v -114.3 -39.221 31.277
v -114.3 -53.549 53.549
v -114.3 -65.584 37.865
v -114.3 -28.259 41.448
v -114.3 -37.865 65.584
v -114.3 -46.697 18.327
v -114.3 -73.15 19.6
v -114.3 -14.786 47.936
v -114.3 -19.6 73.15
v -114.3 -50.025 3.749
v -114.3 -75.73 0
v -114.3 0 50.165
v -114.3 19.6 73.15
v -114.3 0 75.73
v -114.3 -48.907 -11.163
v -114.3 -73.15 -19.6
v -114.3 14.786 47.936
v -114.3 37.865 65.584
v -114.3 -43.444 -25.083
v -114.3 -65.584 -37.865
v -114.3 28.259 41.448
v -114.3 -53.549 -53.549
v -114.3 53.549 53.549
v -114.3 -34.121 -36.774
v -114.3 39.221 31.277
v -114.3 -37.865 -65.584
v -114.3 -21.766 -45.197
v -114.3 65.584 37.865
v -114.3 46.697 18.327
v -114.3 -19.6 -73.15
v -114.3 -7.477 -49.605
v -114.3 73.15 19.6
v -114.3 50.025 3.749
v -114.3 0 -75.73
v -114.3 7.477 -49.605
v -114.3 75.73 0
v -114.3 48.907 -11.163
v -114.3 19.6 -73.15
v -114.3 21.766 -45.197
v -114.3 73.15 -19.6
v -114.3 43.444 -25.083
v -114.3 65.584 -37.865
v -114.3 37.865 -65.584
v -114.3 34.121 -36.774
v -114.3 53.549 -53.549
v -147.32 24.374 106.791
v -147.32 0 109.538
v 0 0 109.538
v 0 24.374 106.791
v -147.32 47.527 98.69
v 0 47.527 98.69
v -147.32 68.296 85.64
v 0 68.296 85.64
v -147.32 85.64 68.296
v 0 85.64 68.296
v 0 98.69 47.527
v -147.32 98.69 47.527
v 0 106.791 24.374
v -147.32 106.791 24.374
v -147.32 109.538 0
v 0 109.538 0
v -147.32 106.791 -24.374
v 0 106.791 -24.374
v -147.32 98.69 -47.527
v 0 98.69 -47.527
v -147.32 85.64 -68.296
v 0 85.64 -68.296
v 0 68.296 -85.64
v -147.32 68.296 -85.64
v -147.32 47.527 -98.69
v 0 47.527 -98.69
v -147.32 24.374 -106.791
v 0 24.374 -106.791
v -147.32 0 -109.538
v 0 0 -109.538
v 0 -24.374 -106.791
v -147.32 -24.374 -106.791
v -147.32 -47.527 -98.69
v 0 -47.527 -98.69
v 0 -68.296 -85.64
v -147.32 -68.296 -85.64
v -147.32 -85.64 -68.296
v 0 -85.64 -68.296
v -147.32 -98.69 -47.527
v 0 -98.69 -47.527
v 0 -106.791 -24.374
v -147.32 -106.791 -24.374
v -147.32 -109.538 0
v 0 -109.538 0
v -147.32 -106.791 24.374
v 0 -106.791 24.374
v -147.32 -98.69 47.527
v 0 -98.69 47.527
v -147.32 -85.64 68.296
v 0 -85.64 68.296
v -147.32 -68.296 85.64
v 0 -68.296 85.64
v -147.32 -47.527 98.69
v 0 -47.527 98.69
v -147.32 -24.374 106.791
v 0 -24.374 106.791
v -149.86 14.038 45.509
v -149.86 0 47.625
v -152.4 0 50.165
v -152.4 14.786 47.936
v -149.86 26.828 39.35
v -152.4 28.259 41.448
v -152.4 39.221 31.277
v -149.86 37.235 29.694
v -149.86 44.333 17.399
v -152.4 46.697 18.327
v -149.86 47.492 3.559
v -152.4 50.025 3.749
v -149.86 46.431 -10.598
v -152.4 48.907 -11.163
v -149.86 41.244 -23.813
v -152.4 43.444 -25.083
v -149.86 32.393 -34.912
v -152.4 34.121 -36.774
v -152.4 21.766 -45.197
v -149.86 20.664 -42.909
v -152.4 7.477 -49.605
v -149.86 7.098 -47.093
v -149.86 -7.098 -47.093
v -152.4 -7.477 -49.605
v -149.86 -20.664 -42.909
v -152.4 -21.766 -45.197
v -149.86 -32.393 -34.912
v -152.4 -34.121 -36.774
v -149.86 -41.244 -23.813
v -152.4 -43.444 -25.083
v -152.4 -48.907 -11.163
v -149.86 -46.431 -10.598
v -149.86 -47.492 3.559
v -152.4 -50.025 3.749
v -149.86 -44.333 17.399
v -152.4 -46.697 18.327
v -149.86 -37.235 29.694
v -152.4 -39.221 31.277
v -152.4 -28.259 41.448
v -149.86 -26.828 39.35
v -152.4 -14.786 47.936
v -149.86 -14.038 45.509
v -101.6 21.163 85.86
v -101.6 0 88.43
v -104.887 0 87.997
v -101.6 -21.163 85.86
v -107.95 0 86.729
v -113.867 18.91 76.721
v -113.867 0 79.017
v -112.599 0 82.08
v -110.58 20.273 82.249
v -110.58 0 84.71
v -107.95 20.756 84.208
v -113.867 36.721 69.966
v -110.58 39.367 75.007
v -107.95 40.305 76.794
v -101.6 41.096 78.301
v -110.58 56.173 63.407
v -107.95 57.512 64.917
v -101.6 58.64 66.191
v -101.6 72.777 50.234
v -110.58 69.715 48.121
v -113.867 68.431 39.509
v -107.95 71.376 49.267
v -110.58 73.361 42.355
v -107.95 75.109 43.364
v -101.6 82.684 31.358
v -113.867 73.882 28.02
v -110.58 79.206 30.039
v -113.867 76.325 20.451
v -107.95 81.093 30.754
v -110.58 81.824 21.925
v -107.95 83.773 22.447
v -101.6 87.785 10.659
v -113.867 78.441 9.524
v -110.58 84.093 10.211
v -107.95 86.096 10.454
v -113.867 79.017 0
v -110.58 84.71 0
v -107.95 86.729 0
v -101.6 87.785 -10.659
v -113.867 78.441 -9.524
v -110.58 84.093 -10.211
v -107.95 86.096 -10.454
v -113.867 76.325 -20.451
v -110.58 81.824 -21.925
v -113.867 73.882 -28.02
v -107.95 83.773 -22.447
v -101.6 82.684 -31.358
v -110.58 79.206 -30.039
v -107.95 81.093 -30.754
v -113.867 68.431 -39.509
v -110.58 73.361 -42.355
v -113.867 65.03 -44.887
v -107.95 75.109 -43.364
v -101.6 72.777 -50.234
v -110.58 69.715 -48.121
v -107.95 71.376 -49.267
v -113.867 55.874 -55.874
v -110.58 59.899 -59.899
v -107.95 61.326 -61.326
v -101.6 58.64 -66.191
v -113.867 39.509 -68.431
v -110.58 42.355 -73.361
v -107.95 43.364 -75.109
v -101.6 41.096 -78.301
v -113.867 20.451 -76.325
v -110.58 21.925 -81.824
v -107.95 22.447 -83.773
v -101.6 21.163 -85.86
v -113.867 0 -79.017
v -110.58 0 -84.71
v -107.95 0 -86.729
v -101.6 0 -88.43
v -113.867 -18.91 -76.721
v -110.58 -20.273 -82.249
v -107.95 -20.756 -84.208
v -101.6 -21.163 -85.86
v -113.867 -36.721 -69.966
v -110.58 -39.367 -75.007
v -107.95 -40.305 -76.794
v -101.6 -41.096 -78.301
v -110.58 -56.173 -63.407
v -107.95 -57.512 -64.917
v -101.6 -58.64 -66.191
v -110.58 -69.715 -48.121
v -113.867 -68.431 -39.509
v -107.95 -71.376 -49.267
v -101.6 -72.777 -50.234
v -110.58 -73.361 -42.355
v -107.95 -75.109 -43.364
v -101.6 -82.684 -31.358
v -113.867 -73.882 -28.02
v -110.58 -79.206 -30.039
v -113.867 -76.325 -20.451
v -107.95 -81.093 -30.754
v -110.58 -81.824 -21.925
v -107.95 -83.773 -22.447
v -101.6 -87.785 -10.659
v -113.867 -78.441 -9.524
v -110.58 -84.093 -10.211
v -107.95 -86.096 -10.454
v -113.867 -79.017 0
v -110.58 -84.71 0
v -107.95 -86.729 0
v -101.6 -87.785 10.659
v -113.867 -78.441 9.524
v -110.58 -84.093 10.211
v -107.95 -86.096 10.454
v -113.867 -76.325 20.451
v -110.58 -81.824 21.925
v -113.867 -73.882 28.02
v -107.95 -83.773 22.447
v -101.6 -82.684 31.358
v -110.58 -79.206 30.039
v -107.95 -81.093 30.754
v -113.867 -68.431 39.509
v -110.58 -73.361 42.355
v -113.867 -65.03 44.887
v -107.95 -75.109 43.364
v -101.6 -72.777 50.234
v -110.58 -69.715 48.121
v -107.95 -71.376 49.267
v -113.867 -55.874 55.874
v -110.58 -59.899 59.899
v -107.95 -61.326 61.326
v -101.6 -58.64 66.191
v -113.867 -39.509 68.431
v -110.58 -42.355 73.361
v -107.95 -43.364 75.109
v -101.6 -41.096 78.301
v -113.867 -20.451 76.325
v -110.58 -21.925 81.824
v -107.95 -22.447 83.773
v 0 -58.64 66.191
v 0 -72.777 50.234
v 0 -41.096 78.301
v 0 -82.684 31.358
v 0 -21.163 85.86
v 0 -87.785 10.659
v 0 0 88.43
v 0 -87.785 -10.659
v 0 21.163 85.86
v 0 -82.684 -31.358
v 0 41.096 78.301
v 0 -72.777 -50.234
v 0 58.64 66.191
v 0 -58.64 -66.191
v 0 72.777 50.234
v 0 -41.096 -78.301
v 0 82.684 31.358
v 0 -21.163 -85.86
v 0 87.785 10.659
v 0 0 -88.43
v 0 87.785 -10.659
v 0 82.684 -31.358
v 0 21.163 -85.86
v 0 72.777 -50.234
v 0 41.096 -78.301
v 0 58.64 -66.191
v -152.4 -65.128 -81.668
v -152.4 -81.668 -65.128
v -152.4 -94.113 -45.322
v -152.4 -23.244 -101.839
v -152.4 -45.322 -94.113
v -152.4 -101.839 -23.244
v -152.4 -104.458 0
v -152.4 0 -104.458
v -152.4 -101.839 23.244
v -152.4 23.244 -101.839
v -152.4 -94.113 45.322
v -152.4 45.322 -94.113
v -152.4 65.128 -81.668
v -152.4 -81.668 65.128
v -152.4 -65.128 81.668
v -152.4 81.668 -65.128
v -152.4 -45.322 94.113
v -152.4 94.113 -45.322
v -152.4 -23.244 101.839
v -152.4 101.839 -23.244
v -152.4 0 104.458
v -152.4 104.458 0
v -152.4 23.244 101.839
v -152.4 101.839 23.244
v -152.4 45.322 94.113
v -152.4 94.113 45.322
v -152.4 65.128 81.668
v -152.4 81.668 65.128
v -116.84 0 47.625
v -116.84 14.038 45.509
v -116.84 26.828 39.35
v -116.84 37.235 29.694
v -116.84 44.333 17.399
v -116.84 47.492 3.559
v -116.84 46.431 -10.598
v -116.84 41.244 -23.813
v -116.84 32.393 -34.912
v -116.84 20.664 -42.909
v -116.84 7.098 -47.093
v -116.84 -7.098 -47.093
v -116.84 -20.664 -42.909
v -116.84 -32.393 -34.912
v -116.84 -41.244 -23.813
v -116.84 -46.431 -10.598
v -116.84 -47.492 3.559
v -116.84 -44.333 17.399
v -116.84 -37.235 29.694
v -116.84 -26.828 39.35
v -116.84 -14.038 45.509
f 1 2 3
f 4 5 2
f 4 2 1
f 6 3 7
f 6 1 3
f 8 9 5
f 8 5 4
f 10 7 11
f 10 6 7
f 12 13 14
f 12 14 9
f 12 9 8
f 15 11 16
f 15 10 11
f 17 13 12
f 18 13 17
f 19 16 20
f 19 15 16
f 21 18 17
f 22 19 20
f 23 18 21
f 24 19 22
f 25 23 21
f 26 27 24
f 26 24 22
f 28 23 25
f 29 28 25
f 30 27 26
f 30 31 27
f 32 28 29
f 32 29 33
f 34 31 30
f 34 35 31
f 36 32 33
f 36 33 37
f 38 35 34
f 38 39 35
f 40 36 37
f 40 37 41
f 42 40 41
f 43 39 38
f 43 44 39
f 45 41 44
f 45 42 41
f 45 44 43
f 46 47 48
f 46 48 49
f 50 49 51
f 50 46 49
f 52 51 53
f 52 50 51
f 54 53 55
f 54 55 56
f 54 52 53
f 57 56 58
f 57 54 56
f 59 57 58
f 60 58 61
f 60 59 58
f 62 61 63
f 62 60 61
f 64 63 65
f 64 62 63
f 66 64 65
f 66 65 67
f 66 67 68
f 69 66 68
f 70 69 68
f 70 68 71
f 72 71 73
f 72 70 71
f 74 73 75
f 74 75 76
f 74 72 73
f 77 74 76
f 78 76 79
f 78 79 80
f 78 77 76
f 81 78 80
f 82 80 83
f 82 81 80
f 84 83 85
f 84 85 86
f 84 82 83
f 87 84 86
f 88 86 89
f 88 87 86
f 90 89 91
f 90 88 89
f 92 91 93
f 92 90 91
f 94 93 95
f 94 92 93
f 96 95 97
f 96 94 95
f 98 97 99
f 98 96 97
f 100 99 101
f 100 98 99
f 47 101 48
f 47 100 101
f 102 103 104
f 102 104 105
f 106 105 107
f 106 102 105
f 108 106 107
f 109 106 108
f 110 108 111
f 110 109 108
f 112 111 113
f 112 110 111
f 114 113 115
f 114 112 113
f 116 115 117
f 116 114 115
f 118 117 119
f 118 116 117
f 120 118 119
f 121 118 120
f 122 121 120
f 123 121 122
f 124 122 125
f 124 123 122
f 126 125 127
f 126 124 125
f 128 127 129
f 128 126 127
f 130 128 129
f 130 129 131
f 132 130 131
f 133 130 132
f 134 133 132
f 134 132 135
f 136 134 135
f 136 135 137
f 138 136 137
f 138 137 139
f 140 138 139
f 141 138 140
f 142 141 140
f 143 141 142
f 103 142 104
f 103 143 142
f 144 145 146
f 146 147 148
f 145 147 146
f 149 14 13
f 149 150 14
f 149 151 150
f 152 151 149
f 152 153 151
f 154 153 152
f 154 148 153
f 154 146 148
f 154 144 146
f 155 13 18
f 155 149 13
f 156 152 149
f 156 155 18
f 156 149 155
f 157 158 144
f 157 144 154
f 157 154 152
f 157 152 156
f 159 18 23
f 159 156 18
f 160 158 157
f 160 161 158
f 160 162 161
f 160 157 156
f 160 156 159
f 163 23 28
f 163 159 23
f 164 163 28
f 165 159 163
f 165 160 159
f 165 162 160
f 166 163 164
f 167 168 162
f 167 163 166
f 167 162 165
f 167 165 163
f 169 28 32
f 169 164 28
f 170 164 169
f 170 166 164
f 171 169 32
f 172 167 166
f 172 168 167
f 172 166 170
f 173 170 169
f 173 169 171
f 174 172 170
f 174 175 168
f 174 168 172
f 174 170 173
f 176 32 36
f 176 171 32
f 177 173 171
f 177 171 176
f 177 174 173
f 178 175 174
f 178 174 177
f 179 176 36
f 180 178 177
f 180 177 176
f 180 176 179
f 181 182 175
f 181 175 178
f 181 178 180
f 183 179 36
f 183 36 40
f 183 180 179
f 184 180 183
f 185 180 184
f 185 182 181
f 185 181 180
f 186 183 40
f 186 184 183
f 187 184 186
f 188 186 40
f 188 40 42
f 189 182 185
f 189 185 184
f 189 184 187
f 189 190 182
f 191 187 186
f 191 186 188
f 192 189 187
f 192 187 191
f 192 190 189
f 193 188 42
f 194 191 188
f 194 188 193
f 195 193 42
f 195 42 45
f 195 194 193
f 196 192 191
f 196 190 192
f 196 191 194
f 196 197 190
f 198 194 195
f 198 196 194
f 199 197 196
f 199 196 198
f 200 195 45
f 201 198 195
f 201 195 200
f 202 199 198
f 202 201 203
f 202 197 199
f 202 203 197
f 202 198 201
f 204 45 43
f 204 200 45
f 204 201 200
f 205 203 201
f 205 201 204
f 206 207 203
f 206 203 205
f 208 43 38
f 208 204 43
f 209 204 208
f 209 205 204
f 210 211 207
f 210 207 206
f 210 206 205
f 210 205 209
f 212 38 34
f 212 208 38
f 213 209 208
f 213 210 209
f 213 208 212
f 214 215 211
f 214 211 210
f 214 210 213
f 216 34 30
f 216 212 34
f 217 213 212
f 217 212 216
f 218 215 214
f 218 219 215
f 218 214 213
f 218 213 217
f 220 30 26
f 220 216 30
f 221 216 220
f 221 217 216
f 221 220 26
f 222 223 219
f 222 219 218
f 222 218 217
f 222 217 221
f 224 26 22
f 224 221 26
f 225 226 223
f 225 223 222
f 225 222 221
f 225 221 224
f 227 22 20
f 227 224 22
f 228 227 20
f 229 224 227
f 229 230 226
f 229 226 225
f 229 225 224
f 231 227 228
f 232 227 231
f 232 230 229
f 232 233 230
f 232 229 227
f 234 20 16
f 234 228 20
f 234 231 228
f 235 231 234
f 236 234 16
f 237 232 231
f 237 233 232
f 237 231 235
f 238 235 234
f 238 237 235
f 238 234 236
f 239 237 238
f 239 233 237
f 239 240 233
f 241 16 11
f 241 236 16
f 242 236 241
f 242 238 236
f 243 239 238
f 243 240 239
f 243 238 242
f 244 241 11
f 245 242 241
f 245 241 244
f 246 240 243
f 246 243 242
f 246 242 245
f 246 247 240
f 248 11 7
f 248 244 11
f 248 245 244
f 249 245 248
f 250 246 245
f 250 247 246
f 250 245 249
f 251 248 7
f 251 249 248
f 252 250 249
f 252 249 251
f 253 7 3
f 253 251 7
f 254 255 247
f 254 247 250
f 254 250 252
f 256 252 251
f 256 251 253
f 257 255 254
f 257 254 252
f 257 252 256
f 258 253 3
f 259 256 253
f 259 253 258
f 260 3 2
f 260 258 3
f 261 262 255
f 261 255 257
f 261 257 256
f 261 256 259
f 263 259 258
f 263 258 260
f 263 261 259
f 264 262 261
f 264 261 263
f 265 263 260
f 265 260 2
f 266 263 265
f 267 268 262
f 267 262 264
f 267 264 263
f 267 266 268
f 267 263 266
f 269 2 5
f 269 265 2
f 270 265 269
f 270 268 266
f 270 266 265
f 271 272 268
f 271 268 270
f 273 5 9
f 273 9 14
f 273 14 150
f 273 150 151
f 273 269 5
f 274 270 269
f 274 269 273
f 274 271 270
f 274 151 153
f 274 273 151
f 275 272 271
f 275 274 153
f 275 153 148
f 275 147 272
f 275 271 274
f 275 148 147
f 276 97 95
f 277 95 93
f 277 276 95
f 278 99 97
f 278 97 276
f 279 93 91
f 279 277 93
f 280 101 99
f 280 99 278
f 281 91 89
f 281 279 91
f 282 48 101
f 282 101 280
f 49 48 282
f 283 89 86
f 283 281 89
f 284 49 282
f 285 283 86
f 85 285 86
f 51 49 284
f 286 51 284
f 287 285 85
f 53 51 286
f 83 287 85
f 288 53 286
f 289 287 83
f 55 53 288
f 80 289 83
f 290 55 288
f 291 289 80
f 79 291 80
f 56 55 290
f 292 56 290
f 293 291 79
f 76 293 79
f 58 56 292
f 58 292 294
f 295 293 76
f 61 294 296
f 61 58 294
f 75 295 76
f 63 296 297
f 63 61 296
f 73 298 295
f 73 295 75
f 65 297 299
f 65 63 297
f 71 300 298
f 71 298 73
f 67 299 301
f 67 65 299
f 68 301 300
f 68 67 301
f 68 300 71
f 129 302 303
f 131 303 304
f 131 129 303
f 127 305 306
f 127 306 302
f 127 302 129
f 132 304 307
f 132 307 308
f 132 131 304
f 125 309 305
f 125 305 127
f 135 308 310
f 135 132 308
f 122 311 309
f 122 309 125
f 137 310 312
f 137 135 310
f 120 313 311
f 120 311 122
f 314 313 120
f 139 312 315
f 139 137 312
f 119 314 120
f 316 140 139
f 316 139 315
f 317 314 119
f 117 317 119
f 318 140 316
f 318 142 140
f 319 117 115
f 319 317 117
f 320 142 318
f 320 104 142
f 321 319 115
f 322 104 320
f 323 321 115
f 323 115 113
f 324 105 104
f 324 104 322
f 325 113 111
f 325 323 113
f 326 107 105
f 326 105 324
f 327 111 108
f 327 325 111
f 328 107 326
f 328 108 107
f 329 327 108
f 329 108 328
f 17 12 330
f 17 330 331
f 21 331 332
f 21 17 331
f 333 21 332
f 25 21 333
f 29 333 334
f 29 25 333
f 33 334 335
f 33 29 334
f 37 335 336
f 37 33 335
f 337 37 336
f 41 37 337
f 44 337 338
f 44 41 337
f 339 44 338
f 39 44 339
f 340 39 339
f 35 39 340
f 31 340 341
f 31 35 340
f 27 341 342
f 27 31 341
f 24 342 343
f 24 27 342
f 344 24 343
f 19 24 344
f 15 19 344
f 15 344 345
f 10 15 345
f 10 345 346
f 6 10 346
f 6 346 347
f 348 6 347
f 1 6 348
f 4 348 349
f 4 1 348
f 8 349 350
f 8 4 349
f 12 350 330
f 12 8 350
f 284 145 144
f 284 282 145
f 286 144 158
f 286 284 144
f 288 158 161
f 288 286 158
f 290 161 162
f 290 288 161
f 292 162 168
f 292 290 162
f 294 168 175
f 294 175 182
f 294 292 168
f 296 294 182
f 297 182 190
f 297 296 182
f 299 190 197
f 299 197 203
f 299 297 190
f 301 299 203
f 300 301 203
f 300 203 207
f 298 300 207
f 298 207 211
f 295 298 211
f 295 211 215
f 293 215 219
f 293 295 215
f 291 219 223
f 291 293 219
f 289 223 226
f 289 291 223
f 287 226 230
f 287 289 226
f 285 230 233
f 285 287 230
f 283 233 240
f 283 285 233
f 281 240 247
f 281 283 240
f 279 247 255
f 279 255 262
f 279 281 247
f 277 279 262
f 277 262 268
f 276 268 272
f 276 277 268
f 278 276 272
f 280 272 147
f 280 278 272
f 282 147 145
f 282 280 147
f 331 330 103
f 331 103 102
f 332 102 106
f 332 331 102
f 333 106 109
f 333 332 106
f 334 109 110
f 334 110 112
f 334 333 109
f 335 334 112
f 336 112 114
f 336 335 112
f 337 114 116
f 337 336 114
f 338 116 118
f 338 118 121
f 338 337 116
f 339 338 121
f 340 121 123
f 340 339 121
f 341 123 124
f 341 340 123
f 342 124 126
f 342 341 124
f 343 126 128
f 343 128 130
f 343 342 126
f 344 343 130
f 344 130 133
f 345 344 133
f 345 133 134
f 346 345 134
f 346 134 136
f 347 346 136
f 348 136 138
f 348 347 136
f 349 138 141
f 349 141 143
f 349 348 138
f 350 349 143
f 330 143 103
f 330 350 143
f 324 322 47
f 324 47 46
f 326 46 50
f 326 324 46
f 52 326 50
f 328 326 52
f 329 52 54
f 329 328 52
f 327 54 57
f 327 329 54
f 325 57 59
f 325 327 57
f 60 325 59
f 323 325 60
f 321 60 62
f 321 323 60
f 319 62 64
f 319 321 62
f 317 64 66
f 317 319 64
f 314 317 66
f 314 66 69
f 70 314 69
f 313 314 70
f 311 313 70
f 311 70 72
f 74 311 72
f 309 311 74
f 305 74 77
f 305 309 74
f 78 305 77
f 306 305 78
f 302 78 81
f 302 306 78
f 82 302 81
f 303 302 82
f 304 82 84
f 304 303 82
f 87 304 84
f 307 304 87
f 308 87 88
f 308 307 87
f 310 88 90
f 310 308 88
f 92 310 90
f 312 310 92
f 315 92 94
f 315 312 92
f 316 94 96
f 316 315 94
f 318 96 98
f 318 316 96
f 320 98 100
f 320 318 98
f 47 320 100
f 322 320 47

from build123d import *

# Parameters (mm, degrees)
F2_SIZE = 5.08
F3_SIZE = 2.54


with BuildPart() as f1:
    # F0 (on Front) → F1 (revolve)
    with BuildSketch(Plane.XZ):
        with BuildLine():
            Line((0, 88.4301), (0, 109.5375))
            Line((0, 109.5375), (-152.4, 109.5375))
            Line((-152.4, 109.5375), (-152.4, 47.625))
            Line((-152.4, 47.625), (-114.3, 47.625))
            Line((-114.3, 47.625), (-114.3, 75.7301))
            ThreePointArc((-114.3, 75.7301), (-110.580256, 84.710356), (-101.6, 88.4301))
            Line((-101.6, 88.4301), (0, 88.4301))
        make_face()
    revolve(axis=Axis((-61.485236, 0, 0), (-1, 0, 0)))

    # F2
    f2_edges = [f1.edges().sort_by_distance(p)[0] for p in [
        (-152.4, 0, -109.5375),
    ]]
    chamfer(f2_edges, length=F2_SIZE)

    # F3
    f3_edges = [f1.edges().sort_by_distance(p)[0] for p in [
        (-152.4, 0, -47.625),
        (-114.3, 0, -47.625),
        (-133.35, 0, 47.625),
    ]]
    chamfer(f3_edges, length=F3_SIZE)


solid = f1.part
